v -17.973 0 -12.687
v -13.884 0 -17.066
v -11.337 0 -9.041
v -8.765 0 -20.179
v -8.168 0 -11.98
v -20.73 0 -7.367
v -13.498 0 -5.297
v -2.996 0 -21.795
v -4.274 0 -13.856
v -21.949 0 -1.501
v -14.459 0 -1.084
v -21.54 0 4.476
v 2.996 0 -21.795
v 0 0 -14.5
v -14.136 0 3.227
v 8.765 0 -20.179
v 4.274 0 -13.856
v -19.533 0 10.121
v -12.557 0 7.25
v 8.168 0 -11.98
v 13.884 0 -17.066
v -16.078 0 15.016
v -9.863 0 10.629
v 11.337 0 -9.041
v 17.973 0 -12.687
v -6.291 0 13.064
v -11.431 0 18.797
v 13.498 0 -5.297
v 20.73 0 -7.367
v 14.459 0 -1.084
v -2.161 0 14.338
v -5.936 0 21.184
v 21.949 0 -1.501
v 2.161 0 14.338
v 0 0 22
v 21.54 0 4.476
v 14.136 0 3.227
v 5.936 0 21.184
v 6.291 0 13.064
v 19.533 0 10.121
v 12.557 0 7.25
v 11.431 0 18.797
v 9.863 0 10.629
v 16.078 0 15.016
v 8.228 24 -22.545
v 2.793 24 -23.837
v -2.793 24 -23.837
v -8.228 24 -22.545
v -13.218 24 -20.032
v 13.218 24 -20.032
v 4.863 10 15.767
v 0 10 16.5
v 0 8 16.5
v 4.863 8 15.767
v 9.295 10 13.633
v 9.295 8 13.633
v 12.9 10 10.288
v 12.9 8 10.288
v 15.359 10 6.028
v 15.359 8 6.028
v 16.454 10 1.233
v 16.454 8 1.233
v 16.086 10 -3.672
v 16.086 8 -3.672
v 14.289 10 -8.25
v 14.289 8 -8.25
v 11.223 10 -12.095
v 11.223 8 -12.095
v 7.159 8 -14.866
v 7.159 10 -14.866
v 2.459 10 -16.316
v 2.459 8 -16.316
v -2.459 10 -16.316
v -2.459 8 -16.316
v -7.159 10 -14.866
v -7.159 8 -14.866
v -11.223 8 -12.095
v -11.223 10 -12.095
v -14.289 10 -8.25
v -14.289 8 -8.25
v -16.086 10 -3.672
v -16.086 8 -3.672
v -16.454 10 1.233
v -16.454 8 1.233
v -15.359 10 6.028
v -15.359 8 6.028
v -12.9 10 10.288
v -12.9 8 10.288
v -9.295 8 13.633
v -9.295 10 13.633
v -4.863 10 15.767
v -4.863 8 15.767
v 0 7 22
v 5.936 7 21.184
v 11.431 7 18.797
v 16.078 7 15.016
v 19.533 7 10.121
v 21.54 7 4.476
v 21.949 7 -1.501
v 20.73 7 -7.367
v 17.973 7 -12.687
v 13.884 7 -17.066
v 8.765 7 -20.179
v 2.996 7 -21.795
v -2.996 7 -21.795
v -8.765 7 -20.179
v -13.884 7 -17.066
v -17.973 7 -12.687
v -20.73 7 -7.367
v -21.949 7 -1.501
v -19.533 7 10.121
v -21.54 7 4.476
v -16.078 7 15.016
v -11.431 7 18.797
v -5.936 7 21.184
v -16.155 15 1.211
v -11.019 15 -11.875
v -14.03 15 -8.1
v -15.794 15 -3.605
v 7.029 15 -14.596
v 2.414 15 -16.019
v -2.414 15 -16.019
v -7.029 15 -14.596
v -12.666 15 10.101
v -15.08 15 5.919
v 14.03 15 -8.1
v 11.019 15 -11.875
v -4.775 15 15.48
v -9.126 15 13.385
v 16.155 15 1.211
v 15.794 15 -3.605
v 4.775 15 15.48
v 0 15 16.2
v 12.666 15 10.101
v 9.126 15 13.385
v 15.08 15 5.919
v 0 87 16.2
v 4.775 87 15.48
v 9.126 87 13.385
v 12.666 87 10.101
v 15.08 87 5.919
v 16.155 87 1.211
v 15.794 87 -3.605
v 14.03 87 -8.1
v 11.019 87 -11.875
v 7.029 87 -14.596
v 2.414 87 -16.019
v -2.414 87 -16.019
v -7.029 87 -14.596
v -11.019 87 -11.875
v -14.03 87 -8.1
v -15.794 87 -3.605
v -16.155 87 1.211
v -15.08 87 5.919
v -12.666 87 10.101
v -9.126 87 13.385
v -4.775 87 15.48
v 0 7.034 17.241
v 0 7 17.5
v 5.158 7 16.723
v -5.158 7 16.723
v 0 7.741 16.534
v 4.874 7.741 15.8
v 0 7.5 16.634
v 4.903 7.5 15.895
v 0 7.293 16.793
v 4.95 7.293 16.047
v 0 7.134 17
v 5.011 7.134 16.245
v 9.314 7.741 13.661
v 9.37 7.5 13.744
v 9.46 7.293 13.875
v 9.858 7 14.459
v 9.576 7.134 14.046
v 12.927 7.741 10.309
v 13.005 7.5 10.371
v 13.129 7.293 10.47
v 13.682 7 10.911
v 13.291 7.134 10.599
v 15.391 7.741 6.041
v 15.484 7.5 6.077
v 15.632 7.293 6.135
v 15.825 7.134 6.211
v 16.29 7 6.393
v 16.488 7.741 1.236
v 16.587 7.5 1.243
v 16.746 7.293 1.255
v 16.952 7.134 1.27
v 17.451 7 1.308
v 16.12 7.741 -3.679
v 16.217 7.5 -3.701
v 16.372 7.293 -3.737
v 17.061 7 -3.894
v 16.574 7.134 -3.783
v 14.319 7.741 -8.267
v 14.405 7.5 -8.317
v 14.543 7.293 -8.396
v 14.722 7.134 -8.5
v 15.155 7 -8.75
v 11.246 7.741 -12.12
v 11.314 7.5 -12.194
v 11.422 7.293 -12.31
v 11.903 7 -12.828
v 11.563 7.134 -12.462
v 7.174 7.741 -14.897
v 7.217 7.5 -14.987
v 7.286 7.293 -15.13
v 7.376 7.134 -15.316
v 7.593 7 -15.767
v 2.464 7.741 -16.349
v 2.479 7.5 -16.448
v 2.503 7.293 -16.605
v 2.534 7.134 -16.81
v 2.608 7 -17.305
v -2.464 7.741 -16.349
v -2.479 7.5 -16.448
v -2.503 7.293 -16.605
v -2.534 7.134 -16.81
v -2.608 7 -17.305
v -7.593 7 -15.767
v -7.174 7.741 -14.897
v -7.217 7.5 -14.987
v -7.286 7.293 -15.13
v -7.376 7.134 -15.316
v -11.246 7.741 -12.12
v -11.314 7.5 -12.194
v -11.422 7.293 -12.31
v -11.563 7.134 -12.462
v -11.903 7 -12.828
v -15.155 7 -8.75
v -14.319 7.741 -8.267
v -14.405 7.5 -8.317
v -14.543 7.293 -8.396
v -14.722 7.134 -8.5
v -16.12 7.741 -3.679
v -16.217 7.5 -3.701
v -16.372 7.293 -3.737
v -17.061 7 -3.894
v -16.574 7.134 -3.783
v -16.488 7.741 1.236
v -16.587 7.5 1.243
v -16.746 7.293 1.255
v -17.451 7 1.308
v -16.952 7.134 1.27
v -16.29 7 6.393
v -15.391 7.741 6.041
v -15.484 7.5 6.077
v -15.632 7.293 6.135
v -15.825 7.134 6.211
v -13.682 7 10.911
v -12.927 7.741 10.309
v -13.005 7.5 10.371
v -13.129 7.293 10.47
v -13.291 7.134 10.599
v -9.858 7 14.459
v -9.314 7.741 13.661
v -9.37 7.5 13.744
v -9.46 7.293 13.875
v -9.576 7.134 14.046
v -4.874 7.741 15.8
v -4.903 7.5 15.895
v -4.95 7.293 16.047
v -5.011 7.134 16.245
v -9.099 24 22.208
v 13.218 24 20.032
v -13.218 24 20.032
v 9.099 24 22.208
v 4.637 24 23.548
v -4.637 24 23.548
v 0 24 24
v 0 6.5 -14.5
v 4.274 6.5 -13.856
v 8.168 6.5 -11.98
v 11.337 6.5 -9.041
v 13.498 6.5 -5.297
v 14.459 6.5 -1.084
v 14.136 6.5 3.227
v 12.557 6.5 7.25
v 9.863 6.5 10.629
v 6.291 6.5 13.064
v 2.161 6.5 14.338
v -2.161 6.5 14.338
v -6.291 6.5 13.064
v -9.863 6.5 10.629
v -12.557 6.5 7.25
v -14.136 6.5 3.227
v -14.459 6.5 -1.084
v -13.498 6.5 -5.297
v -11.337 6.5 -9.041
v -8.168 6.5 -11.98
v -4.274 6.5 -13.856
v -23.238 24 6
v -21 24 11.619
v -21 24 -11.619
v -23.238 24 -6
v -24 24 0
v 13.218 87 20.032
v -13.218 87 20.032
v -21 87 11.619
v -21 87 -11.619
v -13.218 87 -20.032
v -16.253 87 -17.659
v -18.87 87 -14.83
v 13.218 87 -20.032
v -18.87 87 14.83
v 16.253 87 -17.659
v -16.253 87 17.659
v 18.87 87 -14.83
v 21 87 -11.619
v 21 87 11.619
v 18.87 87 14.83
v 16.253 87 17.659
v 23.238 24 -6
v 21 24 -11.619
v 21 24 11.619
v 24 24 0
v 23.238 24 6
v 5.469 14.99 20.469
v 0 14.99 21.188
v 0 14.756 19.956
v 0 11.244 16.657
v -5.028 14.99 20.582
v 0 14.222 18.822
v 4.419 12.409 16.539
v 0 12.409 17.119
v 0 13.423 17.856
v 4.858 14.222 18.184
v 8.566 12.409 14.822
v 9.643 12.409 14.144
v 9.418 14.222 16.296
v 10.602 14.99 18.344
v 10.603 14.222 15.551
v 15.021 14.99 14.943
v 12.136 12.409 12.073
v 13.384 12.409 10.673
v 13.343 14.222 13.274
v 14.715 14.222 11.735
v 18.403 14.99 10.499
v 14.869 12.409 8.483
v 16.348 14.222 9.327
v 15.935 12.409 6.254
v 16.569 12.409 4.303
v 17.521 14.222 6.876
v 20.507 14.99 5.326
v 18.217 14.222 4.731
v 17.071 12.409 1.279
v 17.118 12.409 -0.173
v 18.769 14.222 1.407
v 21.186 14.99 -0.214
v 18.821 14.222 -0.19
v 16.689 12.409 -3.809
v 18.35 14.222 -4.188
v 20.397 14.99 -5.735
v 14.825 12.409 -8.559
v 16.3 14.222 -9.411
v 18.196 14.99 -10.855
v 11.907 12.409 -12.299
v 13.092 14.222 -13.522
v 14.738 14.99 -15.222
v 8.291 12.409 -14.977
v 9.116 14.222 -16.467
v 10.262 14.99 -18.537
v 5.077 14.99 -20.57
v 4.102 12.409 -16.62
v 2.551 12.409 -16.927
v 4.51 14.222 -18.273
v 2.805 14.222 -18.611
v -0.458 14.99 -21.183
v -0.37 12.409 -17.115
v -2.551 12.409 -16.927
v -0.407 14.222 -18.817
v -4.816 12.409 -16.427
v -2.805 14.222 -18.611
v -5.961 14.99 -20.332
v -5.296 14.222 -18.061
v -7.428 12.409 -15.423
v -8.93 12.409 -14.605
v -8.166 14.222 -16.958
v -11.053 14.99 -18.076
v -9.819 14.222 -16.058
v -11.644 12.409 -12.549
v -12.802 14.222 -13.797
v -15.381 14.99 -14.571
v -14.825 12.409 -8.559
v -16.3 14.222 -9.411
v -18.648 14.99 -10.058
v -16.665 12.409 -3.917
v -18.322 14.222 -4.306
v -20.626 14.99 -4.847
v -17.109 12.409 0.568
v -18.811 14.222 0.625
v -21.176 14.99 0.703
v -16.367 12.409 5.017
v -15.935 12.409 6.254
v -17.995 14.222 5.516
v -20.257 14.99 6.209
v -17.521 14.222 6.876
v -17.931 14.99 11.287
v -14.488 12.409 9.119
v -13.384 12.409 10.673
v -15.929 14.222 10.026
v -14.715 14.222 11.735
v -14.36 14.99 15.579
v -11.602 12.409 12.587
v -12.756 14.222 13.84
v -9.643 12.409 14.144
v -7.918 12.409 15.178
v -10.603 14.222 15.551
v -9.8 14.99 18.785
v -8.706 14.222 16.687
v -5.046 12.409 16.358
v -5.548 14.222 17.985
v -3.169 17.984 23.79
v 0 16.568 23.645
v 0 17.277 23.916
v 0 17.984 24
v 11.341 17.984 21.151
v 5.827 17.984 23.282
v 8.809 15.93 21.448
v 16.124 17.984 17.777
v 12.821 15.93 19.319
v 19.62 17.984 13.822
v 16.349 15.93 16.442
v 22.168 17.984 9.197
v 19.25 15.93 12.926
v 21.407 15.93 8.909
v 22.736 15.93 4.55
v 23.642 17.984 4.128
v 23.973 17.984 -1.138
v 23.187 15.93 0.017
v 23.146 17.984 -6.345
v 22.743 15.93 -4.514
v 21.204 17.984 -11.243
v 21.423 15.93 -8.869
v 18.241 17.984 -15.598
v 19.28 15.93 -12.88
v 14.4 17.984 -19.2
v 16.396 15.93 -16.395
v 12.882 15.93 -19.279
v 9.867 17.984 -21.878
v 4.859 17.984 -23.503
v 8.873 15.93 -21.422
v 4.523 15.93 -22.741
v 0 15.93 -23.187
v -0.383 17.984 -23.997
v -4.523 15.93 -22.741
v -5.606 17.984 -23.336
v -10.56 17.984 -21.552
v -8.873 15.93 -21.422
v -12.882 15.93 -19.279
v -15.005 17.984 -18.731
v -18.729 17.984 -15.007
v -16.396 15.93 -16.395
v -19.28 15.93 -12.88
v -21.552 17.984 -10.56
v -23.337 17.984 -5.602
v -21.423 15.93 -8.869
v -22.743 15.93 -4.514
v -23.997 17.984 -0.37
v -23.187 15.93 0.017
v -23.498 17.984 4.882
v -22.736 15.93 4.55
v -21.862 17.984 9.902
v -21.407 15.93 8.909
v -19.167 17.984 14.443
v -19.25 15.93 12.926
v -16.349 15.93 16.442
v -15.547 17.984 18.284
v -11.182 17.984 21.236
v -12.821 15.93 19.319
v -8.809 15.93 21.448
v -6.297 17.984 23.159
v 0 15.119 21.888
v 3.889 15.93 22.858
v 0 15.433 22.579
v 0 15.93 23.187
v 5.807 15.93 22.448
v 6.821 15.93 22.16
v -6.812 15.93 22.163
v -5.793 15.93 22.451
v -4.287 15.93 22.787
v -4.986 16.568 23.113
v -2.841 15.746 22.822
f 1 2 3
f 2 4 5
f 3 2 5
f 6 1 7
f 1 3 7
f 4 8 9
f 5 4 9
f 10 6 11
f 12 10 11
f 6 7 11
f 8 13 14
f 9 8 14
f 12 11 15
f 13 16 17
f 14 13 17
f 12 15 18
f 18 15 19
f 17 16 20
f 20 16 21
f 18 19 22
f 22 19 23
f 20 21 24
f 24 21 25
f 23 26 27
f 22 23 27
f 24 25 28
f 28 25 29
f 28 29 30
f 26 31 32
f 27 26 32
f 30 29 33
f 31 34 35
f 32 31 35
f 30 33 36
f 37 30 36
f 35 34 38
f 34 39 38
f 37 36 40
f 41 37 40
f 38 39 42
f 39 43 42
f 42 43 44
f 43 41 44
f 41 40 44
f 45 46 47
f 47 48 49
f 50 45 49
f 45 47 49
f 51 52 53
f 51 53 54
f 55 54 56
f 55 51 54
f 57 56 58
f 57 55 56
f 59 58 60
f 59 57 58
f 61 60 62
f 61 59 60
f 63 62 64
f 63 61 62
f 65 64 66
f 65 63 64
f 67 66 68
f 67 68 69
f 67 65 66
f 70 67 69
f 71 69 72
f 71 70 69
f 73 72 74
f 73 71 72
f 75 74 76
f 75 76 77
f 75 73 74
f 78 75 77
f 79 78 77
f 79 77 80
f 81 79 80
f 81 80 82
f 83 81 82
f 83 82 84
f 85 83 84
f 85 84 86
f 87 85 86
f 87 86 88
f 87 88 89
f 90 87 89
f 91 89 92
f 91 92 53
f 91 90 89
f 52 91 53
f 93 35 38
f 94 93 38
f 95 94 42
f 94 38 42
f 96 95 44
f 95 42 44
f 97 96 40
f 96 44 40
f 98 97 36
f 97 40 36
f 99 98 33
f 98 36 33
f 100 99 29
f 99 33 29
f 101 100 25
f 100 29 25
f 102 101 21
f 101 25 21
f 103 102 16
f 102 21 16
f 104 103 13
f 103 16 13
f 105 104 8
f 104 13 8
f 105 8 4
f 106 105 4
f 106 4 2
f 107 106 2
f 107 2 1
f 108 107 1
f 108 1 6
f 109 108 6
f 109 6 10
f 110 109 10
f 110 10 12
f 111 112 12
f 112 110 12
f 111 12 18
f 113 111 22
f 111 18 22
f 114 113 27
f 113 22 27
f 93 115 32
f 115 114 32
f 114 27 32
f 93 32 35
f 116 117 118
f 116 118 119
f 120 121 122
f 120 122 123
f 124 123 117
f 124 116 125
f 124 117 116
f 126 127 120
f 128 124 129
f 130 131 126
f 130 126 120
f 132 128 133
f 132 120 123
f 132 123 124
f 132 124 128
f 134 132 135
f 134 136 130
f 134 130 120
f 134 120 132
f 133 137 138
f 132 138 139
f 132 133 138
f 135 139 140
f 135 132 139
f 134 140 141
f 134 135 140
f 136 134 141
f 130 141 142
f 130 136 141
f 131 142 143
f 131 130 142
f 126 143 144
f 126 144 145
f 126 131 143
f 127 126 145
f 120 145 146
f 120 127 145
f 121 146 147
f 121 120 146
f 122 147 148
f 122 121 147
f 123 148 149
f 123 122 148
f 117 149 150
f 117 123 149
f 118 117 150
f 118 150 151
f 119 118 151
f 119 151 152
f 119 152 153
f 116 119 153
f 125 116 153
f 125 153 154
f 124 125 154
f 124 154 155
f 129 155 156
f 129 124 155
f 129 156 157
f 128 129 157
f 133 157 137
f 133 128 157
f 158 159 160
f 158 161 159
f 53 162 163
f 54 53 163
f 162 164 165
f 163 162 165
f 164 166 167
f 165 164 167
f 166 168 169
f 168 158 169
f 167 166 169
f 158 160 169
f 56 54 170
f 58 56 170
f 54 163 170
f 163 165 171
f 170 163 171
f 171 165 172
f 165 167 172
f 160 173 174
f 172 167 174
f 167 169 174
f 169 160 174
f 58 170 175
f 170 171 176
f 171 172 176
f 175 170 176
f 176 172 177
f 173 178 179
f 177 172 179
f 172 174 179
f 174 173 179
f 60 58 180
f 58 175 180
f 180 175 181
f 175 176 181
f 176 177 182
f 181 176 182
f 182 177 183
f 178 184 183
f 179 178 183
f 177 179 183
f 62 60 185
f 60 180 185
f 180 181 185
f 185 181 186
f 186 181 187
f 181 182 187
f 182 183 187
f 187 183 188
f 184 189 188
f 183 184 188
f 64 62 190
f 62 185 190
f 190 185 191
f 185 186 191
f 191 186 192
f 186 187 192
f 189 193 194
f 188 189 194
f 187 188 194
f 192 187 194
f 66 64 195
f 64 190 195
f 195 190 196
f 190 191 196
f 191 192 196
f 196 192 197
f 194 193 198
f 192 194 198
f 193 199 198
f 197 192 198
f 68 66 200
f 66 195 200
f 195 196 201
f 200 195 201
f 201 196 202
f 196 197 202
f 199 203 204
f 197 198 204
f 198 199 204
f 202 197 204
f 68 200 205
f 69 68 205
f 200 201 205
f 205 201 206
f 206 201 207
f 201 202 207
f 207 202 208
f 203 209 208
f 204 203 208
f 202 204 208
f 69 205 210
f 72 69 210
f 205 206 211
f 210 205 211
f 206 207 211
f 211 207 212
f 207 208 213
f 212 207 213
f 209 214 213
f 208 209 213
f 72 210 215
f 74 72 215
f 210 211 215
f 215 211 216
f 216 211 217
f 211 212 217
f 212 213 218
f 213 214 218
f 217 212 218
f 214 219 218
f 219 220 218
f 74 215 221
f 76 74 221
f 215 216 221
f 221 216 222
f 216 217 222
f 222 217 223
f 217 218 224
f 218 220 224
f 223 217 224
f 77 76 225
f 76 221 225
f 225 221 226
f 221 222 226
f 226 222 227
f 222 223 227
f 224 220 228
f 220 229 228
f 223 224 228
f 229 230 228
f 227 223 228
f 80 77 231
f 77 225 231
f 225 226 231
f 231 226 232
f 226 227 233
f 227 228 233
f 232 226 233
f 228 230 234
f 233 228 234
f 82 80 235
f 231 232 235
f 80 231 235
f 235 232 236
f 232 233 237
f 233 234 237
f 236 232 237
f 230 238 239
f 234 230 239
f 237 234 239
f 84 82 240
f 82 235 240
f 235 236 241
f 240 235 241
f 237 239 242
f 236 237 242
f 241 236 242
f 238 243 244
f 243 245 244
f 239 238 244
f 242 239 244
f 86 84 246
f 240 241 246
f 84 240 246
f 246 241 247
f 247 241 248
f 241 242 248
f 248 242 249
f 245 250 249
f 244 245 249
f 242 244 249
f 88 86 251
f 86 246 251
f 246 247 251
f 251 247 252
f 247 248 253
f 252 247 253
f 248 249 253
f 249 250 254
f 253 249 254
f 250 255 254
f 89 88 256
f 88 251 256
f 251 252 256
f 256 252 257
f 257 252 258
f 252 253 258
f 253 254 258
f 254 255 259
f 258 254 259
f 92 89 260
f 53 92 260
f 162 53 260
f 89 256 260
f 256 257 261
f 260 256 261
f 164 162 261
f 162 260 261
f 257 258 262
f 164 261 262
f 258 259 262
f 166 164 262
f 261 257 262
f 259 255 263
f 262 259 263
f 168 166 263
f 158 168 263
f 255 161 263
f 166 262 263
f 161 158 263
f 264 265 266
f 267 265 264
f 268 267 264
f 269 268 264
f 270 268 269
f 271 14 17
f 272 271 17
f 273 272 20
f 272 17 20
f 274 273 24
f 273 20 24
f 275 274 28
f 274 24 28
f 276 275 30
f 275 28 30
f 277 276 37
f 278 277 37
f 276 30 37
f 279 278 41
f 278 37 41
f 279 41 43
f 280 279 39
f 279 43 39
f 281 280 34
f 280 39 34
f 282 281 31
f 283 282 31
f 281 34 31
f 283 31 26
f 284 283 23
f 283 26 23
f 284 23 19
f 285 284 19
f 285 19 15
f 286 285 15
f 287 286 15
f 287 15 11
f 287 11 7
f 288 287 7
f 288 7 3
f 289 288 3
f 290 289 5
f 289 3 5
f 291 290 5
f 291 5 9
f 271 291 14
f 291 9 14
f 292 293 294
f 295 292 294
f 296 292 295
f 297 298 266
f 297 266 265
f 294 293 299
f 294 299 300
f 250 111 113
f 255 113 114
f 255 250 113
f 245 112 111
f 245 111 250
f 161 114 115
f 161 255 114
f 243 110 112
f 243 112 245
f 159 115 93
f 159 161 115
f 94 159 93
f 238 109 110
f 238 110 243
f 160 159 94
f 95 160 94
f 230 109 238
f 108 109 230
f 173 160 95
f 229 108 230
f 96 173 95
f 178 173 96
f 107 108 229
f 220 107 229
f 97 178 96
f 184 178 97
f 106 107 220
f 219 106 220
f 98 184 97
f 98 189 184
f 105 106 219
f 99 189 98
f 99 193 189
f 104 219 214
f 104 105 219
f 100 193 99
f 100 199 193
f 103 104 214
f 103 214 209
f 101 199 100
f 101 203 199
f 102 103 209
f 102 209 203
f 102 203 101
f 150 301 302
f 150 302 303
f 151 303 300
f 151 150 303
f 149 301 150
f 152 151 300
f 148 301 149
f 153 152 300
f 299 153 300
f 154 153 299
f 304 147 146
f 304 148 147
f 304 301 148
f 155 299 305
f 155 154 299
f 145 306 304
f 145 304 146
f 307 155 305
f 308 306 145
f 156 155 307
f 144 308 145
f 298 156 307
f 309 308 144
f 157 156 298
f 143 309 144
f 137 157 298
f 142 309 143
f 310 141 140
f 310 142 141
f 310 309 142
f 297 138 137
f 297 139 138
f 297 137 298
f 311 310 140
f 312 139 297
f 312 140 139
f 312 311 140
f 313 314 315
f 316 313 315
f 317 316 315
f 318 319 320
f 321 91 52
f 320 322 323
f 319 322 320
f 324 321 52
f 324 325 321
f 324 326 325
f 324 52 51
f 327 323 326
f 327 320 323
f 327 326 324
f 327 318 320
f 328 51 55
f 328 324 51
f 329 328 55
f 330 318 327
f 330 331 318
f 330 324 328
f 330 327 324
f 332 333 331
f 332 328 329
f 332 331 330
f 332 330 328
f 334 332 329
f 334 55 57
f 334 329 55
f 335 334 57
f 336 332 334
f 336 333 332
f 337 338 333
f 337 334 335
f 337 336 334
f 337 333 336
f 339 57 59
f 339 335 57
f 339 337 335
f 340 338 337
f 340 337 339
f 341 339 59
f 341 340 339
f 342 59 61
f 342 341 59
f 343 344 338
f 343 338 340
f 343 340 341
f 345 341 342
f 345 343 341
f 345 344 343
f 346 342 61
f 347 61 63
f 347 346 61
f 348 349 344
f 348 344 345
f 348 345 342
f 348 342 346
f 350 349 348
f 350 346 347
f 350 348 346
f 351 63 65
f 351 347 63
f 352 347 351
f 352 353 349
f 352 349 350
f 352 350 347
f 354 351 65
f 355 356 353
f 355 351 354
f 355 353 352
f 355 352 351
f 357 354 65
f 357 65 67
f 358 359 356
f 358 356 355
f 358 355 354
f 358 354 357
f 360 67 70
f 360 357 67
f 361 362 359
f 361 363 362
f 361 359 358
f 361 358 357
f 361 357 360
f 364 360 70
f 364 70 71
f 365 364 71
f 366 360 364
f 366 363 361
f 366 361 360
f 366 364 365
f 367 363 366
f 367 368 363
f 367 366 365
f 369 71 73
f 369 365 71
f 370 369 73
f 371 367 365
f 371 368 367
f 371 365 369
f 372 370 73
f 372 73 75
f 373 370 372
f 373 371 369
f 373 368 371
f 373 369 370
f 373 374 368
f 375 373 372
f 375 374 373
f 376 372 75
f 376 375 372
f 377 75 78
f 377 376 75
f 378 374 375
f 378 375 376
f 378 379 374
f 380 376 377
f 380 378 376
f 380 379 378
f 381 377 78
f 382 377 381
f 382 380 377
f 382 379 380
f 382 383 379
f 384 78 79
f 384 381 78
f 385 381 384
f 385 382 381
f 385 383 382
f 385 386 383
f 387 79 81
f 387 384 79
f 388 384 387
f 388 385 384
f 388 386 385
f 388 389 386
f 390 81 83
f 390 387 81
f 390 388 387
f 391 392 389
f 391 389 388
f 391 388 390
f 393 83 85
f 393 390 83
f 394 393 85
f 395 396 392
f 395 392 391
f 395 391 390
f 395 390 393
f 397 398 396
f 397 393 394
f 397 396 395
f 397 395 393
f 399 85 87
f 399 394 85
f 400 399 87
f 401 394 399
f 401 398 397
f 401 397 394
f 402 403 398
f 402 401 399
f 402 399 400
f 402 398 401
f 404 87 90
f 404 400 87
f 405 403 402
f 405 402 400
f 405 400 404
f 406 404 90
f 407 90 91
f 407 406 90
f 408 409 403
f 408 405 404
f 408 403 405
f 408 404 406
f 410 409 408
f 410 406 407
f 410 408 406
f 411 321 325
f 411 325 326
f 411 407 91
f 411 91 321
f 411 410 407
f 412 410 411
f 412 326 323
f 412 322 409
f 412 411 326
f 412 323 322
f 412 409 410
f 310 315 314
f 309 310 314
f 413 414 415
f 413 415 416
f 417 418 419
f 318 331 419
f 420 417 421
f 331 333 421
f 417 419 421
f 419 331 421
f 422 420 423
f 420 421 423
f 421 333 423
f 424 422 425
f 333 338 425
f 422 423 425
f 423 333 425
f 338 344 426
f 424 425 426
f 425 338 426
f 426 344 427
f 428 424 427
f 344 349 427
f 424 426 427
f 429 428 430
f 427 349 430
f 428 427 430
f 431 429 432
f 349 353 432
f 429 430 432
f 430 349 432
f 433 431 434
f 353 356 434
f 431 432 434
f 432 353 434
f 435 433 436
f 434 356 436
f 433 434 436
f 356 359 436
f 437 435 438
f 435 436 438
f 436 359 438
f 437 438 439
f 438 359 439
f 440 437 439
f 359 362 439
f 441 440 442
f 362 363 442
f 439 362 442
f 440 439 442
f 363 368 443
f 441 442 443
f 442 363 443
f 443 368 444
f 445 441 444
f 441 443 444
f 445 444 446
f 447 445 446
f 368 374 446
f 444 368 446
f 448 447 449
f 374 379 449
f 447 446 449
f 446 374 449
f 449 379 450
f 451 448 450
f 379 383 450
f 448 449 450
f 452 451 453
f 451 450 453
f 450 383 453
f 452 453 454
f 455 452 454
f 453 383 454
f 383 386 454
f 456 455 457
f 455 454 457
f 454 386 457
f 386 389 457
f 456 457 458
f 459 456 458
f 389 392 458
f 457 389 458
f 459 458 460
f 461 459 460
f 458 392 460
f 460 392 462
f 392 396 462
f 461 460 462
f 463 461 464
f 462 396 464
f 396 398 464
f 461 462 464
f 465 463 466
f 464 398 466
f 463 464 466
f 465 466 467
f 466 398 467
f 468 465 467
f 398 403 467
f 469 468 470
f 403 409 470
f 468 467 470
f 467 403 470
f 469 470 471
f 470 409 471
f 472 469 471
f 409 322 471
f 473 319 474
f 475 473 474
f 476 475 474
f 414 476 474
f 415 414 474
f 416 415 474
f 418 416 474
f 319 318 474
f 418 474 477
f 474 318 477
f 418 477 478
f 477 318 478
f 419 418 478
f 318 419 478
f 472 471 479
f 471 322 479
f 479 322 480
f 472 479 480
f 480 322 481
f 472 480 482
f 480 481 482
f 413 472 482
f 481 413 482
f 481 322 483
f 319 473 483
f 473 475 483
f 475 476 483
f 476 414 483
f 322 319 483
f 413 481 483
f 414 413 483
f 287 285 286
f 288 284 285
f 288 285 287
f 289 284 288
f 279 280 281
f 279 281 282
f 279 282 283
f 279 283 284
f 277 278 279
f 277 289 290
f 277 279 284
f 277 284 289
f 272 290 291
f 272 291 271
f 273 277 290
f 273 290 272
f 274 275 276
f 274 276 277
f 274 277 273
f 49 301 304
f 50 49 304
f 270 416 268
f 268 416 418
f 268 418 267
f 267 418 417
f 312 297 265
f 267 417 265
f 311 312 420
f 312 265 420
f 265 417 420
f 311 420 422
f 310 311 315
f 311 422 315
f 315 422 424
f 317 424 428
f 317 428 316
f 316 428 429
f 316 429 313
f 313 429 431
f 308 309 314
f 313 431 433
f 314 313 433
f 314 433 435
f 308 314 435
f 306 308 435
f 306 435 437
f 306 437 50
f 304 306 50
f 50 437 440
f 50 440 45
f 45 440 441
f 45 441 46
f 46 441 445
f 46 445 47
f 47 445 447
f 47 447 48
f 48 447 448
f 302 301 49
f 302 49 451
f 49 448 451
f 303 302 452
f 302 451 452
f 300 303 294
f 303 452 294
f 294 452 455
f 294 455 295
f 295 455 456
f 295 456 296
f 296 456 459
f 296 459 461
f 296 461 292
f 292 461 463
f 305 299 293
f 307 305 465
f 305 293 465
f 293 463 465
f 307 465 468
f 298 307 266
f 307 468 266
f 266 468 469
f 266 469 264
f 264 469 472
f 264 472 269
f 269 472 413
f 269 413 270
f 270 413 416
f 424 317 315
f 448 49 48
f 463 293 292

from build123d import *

# Parameters (mm, degrees)
SKETCH_1_R                 = 22
EXTRUDE_1_DEPTH            = 15
SKETCH_2_R                 = 14.5
CUT_EXTRUDE_2_DEPTH        = 6.5
SKETCH_4_R                 = 25
SKETCH_4_R_2               = 16.5
CUT_EXTRUDE_1_DEPTH        = 8
SKETCH_5_R                 = 24
SKETCH_5_R_2               = 16.2
EXTRUDE_4_DEPTH            = 72
FILLET_1_R                 = 1
FILLET_2_R                 = 5
FILLET_3_R                 = 3
CUT_EXTRUDE_2_2_DEPTH      = 50
CUT_EXTRUDE_2_2_DEPTH_BACK = 26
CUT_EXTRUDE_2_2_START      = 50
SKETCH_6_W                 = 42
SKETCH_6_H                 = 40.064513034


with BuildPart() as part:
    # Эскиз1 → Вытянуть1 (new body)
    with BuildSketch(Plane(origin=(0, 0, 0), x_dir=(1, 0, 0), z_dir=(0, 1, 0))):
        with Locations(Location((0, 0, 0), (0, 0, 270))):
            Circle(SKETCH_1_R)
    extrude(amount=EXTRUDE_1_DEPTH)

    # Эскиз2 → Cut-Extrude 2 (cut)
    with BuildSketch(Plane.XZ):
        with Locations(Location((0, 0, 0), (0, 0, 270))):
            Circle(SKETCH_2_R)
    extrude(amount=-CUT_EXTRUDE_2_DEPTH, mode=Mode.SUBTRACT)

    # Эскиз4 → Вырез-Вытянуть1 (cut)
    with BuildSketch(Plane(origin=(0, 15, 0), x_dir=(1, 0, 0), z_dir=(0, 1, 0))):
        Circle(SKETCH_4_R)
        with Locations(Location((0, 0, 0), (0, 0, 270))):
            Circle(SKETCH_4_R_2, mode=Mode.SUBTRACT)
    extrude(amount=-CUT_EXTRUDE_1_DEPTH, mode=Mode.SUBTRACT)

    # Эскиз5 → Вытянуть4 (add)
    with BuildSketch(Plane(origin=(0, 15, 0), x_dir=(1, 0, 0), z_dir=(0, 1, 0))):
        with Locations(Location((0, 0, 0), (0, 0, 270))):
            Circle(SKETCH_5_R)
        with Locations(Location((0, 0, 0), (0, 0, 270))):
            Circle(SKETCH_5_R_2, mode=Mode.SUBTRACT)
    extrude(amount=EXTRUDE_4_DEPTH)

    # Скругление1
    fillet_1_edges = [part.edges().sort_by_distance(p)[0] for p in [
        (0, 7, -16.5),
    ]]
    fillet(fillet_1_edges, radius=FILLET_1_R)

    # Скругление2
    fillet_2_edges = [part.edges().sort_by_distance(p)[0] for p in [
        (0, 15, -16.5),
    ]]
    fillet(fillet_2_edges, radius=FILLET_2_R)

    # Скругление3
    fillet_3_edges = [part.edges().sort_by_distance(p)[0] for p in [
        (0, 15, -24),
    ]]
    fillet(fillet_3_edges, radius=FILLET_3_R)

    # Эскиз6 → Cut-Extrude 2 2 (cut, two sides: drawn at the far end of the back side and taken through both)
    with BuildSketch(Plane(origin=(0, 0, 0), x_dir=(1, 0, 0), z_dir=(0, 1, 0)).offset(CUT_EXTRUDE_2_2_START - CUT_EXTRUDE_2_2_DEPTH_BACK)):
        Polygon((21, 29.701884449), (36.425926694, 29.701884449), (36.425926694, -29.522725679), (-36.425926694, -29.522725679), (-36.425926694, 29.701884449), (-21, 29.701884449), align=None)
        Rectangle(SKETCH_6_W, SKETCH_6_H, mode=Mode.SUBTRACT)
    extrude(amount=CUT_EXTRUDE_2_2_DEPTH + CUT_EXTRUDE_2_2_DEPTH_BACK, mode=Mode.SUBTRACT)


solid = part.part
